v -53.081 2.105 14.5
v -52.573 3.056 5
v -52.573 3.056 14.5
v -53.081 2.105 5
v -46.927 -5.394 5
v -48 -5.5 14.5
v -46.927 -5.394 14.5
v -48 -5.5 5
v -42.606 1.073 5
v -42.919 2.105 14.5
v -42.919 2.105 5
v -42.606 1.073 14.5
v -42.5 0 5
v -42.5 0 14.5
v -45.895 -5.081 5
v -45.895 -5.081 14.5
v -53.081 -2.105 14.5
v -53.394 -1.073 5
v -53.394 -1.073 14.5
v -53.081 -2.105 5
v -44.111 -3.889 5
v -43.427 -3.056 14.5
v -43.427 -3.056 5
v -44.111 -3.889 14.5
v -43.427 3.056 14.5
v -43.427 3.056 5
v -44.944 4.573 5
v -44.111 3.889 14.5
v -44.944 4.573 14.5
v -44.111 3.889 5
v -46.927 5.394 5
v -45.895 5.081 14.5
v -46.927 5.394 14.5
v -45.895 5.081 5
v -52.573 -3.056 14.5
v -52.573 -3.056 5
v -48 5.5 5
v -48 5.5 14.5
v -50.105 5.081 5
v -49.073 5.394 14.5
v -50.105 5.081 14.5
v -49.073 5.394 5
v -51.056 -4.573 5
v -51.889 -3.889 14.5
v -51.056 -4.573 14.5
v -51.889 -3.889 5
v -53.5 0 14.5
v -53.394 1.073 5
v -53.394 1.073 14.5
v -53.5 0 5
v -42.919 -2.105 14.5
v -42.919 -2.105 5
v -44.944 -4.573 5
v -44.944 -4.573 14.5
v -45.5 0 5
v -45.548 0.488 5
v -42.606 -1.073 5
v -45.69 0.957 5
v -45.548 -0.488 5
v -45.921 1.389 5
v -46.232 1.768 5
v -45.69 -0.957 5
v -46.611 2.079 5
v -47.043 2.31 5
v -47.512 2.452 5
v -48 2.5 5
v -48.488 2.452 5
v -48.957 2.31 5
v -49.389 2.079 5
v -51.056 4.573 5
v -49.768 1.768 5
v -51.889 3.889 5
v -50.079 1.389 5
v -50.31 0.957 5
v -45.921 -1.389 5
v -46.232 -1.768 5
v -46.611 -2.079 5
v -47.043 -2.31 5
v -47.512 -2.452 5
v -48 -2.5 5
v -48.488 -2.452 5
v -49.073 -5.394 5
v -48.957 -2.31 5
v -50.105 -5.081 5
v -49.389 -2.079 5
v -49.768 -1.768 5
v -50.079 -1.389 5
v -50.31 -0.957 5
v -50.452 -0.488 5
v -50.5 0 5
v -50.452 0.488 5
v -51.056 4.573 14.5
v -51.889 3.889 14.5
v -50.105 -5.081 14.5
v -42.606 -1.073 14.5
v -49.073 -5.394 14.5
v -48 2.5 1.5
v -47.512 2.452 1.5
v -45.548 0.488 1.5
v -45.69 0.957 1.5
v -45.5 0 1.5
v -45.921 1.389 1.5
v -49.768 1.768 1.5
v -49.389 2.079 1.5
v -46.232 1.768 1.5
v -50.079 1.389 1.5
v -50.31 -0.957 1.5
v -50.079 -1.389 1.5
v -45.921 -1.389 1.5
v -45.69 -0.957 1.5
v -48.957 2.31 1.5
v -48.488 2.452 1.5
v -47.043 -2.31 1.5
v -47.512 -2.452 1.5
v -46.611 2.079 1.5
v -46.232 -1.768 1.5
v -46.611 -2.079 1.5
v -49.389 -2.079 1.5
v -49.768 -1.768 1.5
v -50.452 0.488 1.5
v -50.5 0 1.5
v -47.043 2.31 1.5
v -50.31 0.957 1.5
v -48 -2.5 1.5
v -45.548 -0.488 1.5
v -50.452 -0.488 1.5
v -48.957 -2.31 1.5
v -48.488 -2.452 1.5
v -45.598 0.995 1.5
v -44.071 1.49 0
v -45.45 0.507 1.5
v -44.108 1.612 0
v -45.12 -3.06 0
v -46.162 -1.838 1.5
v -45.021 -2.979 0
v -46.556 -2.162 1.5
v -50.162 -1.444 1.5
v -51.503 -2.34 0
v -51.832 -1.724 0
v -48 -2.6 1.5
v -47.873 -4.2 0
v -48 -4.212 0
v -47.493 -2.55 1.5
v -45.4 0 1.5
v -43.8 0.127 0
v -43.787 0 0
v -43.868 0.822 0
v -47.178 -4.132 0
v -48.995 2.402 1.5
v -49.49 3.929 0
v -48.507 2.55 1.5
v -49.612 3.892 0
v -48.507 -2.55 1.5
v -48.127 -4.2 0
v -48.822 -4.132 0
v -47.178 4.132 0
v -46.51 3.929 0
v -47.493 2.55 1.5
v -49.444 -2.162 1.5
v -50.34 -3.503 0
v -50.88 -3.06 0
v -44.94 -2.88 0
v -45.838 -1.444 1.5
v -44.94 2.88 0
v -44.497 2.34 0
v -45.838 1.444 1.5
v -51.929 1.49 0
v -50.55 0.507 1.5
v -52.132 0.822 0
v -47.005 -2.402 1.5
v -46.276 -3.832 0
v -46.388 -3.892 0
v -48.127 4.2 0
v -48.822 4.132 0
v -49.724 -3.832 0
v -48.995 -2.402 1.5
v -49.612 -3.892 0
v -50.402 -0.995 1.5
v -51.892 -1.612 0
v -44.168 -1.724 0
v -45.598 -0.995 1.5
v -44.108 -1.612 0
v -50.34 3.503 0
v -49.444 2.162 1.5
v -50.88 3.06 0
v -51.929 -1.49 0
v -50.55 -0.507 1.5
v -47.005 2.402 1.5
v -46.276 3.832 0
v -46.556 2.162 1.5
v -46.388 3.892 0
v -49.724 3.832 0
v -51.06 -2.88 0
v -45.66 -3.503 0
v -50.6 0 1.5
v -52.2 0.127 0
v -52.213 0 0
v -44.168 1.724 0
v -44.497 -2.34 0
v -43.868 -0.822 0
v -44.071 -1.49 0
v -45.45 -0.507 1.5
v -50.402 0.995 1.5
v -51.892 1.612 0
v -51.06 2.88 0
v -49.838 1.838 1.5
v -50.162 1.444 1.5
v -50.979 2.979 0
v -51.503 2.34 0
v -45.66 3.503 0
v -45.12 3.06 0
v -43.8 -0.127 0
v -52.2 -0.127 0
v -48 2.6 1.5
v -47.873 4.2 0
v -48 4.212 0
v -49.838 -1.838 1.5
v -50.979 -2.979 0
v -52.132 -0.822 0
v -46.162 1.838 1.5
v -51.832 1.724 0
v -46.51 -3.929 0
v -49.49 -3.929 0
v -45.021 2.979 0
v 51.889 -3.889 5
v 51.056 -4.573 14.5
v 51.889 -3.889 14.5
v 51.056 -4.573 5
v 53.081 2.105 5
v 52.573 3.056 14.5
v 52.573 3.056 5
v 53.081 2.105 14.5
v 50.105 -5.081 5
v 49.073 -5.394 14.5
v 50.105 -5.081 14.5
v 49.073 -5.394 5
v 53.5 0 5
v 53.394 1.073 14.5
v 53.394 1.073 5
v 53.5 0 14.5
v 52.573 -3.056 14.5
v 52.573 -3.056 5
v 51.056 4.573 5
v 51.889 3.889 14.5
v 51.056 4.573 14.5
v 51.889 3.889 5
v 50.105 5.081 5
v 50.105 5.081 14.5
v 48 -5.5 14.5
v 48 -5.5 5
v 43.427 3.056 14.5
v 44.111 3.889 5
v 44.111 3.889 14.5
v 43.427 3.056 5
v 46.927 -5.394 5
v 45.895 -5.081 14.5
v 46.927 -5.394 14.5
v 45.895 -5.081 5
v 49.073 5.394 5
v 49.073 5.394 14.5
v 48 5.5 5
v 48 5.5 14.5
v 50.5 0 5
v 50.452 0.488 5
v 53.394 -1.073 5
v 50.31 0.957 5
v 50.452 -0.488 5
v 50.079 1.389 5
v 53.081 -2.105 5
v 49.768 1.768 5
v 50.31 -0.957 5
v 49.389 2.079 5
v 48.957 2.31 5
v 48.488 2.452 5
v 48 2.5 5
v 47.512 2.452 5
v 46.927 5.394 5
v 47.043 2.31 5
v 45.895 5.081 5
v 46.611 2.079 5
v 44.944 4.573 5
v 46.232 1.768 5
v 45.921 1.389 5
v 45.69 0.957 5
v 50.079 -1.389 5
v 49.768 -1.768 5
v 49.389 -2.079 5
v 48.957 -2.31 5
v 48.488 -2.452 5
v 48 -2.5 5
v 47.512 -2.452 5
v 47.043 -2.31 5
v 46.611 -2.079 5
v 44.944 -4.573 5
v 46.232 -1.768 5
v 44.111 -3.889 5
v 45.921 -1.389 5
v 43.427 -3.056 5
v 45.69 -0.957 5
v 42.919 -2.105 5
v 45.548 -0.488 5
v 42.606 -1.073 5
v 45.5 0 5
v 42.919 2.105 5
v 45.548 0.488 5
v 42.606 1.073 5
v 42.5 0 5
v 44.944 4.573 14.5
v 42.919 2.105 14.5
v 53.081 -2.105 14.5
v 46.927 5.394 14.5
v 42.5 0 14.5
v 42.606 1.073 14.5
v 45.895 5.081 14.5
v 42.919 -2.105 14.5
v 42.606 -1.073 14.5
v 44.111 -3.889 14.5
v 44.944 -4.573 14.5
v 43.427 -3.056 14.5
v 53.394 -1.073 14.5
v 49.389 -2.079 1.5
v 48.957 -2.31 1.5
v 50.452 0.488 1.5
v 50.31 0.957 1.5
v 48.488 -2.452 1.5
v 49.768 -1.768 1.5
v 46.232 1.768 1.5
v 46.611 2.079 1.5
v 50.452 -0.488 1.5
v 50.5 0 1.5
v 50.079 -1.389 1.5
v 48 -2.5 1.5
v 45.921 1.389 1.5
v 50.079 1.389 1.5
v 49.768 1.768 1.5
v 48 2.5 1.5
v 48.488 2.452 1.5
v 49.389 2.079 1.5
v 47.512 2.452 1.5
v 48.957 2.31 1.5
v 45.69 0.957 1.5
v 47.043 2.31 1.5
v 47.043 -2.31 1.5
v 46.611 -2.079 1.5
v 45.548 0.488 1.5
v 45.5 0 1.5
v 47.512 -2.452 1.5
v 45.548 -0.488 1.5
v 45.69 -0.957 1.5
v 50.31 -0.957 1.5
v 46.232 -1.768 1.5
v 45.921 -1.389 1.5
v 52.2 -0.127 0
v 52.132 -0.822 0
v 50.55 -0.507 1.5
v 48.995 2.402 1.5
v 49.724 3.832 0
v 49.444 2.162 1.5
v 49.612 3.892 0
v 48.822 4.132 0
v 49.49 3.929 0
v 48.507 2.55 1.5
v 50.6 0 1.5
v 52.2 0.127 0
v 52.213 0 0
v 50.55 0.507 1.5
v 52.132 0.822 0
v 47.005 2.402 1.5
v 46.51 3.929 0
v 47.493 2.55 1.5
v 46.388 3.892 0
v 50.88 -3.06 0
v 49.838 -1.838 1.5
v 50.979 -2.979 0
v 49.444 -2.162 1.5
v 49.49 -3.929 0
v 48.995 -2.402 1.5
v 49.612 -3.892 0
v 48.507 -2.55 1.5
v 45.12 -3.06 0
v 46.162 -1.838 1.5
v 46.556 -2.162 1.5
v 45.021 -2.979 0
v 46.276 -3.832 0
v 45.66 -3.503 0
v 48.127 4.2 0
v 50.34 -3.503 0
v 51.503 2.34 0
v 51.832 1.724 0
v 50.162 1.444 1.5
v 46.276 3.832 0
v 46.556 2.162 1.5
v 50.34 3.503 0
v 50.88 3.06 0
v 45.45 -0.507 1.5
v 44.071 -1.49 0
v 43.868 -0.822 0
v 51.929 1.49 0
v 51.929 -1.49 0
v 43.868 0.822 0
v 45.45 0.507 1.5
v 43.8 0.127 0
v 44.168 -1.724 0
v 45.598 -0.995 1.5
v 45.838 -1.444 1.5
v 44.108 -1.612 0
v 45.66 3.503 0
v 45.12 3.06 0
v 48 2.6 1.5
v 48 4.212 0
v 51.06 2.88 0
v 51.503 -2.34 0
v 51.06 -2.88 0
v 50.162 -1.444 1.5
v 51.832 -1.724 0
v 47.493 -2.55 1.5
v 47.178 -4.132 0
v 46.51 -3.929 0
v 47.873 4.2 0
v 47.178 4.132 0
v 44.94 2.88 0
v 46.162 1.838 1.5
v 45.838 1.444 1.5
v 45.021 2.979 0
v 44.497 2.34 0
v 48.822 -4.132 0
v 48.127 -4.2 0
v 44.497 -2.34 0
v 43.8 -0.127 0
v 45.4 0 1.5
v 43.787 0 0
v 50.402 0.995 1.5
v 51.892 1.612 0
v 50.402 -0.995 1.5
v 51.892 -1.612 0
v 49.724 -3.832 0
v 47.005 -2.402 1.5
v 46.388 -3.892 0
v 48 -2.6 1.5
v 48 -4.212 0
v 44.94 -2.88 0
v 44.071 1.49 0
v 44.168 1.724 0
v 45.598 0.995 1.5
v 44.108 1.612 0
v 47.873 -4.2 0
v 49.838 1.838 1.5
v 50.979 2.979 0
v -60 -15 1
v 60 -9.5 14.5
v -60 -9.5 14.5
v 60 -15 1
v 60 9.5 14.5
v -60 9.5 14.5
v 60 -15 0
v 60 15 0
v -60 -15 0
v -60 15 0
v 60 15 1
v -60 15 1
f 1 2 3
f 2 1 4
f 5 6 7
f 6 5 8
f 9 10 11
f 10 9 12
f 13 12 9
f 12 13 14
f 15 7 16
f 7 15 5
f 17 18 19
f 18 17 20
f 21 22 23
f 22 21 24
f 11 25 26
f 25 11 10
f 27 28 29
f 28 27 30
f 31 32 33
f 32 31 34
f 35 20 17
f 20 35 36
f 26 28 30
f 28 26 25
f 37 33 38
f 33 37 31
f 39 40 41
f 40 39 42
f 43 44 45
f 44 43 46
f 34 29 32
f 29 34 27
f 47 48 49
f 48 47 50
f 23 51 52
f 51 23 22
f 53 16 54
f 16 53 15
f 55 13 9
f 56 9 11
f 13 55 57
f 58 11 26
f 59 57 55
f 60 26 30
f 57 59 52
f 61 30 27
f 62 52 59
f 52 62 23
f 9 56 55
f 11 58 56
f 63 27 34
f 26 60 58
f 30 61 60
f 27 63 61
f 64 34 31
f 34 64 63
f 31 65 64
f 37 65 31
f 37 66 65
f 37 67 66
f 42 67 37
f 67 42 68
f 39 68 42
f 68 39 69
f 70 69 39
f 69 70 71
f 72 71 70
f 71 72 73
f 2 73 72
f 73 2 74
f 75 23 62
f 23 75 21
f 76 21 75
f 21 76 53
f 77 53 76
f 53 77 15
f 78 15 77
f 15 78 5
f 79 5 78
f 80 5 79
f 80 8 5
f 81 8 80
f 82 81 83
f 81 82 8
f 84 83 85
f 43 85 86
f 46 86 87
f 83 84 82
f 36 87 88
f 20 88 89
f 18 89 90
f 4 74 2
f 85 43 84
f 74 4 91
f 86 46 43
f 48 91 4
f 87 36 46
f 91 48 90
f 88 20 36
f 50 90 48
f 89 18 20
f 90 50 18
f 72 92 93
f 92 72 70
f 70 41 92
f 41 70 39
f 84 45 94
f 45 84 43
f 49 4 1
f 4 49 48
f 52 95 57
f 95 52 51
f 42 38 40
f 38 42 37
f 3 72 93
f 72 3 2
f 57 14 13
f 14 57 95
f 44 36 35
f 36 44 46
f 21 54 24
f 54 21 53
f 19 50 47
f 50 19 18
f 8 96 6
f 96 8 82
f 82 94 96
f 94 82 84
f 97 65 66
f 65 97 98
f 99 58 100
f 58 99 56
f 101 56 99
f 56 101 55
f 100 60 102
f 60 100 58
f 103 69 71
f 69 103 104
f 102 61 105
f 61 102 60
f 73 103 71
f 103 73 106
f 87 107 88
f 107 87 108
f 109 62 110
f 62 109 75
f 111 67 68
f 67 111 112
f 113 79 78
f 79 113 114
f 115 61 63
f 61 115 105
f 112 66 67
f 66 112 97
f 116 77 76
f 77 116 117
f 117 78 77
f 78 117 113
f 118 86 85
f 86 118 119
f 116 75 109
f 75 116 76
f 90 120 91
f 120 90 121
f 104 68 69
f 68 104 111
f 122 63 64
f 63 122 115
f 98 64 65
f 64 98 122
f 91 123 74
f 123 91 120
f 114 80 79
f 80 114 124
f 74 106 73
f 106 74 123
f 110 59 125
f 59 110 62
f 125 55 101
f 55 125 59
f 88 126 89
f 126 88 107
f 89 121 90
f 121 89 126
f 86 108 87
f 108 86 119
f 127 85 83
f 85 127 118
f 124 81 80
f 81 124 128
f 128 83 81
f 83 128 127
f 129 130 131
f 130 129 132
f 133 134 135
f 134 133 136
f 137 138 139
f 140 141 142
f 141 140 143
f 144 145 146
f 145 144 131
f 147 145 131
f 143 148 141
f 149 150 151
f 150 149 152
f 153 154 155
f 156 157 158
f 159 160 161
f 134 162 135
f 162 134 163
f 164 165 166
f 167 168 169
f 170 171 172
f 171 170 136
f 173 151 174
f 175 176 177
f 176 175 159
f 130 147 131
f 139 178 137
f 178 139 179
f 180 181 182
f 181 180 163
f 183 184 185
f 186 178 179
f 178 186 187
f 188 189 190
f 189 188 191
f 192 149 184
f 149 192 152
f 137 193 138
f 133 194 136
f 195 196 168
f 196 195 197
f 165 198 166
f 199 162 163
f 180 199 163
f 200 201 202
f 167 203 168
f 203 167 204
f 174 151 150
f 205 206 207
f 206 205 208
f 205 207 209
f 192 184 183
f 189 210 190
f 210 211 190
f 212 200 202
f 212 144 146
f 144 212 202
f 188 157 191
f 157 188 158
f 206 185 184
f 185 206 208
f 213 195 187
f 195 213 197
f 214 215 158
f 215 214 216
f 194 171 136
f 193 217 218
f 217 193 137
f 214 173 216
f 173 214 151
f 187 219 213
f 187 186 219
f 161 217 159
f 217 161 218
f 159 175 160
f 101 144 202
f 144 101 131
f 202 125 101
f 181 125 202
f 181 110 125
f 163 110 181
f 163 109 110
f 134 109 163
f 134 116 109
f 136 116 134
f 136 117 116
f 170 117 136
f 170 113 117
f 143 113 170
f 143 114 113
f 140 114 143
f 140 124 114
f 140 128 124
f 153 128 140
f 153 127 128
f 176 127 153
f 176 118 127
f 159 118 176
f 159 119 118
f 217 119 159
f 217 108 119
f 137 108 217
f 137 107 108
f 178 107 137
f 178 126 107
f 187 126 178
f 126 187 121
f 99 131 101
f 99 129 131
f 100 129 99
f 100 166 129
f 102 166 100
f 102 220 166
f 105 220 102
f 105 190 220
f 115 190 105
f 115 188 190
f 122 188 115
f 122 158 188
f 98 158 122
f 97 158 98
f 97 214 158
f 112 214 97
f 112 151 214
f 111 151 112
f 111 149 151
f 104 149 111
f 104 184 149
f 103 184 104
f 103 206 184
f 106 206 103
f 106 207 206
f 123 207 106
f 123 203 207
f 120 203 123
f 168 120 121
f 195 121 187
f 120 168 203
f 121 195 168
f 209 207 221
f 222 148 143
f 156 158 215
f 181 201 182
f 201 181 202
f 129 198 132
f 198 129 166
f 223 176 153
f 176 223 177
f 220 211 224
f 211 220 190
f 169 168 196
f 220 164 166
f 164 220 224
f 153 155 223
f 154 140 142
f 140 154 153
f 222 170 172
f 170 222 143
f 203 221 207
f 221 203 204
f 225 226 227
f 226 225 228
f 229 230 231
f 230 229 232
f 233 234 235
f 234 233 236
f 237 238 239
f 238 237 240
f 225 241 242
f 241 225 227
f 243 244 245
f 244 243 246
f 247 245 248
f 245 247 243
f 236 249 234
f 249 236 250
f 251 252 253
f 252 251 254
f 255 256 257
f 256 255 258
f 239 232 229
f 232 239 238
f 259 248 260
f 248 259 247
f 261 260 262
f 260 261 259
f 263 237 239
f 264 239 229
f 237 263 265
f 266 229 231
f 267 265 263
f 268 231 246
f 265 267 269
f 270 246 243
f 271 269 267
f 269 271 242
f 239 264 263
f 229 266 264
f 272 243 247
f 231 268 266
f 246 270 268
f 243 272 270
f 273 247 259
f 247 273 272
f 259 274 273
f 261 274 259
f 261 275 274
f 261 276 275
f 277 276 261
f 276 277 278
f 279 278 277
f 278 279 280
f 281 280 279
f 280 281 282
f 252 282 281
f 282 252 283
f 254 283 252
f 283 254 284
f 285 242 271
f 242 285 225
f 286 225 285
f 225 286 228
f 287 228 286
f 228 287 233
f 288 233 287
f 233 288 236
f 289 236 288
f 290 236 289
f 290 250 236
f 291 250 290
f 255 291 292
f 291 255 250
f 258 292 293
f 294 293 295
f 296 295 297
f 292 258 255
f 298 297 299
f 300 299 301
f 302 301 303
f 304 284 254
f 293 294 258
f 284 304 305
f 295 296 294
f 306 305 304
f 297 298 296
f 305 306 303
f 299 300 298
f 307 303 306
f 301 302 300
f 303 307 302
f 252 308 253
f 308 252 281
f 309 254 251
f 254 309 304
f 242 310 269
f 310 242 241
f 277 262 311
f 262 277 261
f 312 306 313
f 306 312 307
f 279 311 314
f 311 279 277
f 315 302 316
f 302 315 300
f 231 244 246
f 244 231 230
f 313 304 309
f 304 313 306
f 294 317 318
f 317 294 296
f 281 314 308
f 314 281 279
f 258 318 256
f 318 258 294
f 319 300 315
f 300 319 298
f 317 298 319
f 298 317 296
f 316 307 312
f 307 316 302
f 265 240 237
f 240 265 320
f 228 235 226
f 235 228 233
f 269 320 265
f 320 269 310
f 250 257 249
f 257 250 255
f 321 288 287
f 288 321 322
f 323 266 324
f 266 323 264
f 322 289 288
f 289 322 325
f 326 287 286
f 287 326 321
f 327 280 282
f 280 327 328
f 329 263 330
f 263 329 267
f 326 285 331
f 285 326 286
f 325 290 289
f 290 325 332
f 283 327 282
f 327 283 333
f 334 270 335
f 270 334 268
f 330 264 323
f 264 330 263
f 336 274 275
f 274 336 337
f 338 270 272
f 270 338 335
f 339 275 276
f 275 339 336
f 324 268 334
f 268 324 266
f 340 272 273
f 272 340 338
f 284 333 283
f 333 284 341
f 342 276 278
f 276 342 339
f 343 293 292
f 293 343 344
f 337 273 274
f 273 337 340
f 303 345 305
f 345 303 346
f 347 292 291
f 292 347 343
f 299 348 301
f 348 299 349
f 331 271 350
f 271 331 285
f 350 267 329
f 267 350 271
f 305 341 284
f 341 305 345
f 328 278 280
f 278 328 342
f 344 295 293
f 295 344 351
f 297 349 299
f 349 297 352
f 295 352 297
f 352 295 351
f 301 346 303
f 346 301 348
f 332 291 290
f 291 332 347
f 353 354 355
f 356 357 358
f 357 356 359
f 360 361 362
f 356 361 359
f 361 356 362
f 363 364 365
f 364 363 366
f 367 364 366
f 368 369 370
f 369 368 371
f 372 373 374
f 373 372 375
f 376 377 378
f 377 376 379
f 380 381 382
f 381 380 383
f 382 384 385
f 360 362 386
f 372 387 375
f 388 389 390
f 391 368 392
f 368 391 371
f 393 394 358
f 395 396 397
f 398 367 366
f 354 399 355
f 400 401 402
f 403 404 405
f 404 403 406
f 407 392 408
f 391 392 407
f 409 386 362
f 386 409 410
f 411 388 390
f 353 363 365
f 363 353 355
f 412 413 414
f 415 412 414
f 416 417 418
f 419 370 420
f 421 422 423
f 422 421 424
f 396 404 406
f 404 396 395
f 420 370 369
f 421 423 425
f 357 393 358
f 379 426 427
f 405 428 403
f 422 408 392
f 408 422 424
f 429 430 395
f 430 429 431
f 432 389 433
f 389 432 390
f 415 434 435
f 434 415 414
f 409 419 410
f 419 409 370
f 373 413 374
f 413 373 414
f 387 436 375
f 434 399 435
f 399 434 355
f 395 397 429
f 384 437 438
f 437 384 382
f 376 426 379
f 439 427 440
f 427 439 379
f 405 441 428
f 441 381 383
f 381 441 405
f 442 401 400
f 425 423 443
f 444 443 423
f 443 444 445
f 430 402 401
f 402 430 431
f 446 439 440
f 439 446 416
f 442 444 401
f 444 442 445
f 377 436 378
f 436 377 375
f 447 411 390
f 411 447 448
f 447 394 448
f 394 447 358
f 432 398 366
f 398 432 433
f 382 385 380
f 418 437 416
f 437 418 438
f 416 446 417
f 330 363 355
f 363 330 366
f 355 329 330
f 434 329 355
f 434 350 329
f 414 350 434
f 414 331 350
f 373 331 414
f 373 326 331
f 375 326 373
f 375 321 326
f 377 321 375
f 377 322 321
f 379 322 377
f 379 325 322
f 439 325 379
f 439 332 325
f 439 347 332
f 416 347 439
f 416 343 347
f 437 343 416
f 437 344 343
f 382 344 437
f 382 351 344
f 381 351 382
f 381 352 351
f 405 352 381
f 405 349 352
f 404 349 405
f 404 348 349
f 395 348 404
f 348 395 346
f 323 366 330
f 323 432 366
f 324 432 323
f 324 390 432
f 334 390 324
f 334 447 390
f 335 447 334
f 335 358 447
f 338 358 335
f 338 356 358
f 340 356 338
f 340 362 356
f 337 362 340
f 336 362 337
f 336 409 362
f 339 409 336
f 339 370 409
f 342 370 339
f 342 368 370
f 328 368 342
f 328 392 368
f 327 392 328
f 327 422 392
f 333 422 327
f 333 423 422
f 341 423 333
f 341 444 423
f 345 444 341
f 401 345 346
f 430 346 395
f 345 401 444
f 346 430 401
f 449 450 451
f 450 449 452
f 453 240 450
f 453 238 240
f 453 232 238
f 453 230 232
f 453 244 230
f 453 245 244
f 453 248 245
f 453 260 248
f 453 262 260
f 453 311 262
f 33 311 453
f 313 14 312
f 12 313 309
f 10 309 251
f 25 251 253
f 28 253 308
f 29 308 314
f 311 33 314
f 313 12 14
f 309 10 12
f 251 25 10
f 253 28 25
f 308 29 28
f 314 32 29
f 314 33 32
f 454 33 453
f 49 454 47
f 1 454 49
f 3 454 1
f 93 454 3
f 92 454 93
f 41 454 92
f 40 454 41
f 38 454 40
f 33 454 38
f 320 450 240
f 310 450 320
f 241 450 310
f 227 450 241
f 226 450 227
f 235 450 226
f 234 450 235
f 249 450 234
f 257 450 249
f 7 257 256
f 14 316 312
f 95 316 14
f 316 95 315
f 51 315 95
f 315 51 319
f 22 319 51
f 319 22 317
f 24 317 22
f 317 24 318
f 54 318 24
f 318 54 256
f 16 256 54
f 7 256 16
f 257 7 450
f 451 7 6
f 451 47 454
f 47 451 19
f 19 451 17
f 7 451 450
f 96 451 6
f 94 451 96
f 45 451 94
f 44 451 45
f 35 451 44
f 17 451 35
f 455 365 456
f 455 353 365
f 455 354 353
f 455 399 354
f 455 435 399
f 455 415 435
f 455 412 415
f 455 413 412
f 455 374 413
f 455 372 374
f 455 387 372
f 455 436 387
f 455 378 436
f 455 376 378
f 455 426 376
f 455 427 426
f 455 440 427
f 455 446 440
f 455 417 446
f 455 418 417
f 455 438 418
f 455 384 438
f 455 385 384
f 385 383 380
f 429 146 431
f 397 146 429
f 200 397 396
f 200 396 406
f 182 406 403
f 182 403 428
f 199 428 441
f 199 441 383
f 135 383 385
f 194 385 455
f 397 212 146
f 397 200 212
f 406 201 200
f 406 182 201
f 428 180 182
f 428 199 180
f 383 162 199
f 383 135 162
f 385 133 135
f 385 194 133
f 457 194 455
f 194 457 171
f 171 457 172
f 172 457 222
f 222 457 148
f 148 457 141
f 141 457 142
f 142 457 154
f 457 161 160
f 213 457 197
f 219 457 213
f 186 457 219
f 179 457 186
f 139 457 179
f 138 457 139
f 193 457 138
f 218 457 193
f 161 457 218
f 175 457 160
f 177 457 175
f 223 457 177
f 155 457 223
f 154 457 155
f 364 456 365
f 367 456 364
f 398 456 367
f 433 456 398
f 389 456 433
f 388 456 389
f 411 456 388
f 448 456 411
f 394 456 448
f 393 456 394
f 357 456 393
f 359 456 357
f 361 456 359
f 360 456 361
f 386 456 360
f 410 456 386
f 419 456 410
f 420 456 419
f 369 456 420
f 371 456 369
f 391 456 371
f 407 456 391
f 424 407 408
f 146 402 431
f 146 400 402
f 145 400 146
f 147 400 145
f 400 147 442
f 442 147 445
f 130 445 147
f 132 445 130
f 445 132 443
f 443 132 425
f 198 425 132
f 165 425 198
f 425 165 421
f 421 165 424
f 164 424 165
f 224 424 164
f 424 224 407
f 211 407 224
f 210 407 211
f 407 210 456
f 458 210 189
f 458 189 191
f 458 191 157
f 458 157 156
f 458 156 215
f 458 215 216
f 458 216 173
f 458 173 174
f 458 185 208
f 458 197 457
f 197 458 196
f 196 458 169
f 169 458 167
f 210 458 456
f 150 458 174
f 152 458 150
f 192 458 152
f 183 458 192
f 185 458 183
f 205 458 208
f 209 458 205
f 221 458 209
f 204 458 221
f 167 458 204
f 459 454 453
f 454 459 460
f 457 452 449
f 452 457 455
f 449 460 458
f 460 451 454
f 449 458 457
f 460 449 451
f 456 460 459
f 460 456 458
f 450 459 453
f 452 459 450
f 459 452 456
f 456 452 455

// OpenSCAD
$fn=32;

module handle_support() {
    difference() {
        hull() {
            translate([0,0,0.5])cube([120, 30, 1], center=true);
            translate([0,0,14]) cube([120, 19, 1], center=true);
        }
        for (x=[-96/2, 96/2]) {
                translate([x, 0, 0]){
                    translate([0, 0, 5]){cylinder(h=20, d=11, center=false);}
                    translate([0, 0, -0.5]){cylinder(h=10, d=5, center=false);}
                    translate([0, 0, -0.5]){cylinder(h=2, d1=9.5, d2=5.2, center=false);}
                }
            }
        // Cutout for handle
        // translate([-20, -10, 0])
        //     cube([40, 20, 5], center=true);
    }
}   handle_support();
